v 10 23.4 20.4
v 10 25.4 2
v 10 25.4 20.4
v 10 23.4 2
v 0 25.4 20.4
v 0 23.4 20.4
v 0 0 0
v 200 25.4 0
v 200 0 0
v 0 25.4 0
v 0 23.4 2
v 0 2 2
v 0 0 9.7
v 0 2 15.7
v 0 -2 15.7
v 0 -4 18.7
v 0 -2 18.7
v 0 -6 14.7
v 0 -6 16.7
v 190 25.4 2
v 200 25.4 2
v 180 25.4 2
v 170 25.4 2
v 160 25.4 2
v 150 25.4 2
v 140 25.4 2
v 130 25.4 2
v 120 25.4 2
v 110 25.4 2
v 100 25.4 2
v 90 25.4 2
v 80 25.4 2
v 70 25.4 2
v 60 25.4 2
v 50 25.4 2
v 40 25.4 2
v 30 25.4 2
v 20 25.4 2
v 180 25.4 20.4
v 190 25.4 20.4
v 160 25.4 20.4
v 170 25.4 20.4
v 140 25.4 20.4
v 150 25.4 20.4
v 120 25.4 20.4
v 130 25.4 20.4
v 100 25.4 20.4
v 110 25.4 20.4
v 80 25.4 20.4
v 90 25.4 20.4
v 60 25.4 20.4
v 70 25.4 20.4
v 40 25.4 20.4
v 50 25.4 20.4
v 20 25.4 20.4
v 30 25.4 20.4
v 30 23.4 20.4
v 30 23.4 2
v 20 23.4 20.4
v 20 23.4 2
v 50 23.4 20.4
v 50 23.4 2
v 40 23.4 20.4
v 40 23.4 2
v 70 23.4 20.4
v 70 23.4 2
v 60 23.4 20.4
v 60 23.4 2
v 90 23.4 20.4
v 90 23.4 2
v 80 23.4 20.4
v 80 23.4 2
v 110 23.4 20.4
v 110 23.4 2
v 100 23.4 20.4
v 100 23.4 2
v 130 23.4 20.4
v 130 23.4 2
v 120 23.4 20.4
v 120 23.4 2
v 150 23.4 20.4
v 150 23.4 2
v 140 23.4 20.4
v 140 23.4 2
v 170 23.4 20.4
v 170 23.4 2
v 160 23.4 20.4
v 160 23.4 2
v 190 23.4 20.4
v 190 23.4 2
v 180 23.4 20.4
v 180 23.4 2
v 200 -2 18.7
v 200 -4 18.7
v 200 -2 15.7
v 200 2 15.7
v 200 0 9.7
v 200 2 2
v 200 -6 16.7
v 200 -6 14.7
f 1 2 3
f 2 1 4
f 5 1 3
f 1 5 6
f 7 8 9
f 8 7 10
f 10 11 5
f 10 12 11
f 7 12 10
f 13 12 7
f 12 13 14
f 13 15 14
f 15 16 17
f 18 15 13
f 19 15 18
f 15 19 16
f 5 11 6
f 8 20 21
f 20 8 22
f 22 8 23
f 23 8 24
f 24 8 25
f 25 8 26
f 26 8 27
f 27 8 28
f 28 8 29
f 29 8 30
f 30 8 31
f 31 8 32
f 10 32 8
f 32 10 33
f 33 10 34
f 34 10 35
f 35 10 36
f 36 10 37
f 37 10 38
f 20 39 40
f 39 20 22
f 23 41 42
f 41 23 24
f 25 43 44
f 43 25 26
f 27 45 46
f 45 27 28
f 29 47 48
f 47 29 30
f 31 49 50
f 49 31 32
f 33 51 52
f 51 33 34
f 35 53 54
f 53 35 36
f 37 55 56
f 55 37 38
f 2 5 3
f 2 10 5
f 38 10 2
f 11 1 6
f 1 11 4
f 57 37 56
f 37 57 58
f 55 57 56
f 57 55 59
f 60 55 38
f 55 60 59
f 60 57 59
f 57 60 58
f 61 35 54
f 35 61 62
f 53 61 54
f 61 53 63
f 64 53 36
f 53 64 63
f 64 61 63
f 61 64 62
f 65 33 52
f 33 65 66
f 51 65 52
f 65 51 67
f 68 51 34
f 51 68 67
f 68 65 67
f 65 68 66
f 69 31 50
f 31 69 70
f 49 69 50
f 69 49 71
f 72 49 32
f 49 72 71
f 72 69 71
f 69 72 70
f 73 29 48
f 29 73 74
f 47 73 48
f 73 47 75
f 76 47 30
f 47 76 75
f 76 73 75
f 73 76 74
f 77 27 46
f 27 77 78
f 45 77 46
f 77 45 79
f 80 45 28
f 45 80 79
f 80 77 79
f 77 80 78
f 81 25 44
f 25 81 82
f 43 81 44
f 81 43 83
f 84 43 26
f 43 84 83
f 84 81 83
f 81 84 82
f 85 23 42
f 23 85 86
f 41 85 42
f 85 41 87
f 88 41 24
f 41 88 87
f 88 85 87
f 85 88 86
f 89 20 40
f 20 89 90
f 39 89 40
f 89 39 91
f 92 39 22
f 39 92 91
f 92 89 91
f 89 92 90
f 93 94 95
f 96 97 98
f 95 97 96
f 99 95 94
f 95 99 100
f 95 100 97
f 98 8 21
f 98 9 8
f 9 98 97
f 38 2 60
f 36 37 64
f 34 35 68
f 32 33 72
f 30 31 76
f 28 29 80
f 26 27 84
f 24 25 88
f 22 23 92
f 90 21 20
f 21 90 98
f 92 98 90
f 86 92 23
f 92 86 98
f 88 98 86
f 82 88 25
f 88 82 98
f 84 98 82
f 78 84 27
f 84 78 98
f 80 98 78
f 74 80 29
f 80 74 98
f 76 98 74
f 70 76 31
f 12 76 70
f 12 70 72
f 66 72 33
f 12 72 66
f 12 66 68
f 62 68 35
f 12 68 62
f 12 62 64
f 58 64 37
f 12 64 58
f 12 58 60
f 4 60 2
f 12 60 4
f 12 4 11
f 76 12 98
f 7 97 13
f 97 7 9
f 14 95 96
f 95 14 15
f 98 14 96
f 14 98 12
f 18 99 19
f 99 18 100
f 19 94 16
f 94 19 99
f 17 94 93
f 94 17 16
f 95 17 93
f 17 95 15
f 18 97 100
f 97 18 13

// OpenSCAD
mm = 1;
inch = 25.4 * mm;

length = 200 * mm;
slot_width = 10 * mm;
slot_pitch = 20 * mm;

thickness = 2 * mm;
total_width = 1 * inch;
total_height = 1 * inch;

module tslot_insert()
{
    polygon(points = [
        [-thickness, 3],
        [-thickness, -3],
        [0, -3],
        [6, 2],
        [6, 4],
        [4, 6],
        [2, 6],
        [2, 3],
    ], convexity = 2);
}


module cable_raceway()
{
    cube([length, total_width, thickness]);
    cube([length, thickness, 0.5 * inch + 3 * mm]);

    for (i=[0:(length / slot_pitch) - 1])
    {
        translate([i * slot_pitch, total_width - thickness, 0]) cube([slot_pitch - slot_width, thickness, total_height - slot_width / 2]);
    }

    translate([length, 0, 0.5 * inch])
    rotate([90, 0, -90])
    linear_extrude(length) tslot_insert();
}

cable_raceway();
// translate([0, -50]) tslot_insert();
